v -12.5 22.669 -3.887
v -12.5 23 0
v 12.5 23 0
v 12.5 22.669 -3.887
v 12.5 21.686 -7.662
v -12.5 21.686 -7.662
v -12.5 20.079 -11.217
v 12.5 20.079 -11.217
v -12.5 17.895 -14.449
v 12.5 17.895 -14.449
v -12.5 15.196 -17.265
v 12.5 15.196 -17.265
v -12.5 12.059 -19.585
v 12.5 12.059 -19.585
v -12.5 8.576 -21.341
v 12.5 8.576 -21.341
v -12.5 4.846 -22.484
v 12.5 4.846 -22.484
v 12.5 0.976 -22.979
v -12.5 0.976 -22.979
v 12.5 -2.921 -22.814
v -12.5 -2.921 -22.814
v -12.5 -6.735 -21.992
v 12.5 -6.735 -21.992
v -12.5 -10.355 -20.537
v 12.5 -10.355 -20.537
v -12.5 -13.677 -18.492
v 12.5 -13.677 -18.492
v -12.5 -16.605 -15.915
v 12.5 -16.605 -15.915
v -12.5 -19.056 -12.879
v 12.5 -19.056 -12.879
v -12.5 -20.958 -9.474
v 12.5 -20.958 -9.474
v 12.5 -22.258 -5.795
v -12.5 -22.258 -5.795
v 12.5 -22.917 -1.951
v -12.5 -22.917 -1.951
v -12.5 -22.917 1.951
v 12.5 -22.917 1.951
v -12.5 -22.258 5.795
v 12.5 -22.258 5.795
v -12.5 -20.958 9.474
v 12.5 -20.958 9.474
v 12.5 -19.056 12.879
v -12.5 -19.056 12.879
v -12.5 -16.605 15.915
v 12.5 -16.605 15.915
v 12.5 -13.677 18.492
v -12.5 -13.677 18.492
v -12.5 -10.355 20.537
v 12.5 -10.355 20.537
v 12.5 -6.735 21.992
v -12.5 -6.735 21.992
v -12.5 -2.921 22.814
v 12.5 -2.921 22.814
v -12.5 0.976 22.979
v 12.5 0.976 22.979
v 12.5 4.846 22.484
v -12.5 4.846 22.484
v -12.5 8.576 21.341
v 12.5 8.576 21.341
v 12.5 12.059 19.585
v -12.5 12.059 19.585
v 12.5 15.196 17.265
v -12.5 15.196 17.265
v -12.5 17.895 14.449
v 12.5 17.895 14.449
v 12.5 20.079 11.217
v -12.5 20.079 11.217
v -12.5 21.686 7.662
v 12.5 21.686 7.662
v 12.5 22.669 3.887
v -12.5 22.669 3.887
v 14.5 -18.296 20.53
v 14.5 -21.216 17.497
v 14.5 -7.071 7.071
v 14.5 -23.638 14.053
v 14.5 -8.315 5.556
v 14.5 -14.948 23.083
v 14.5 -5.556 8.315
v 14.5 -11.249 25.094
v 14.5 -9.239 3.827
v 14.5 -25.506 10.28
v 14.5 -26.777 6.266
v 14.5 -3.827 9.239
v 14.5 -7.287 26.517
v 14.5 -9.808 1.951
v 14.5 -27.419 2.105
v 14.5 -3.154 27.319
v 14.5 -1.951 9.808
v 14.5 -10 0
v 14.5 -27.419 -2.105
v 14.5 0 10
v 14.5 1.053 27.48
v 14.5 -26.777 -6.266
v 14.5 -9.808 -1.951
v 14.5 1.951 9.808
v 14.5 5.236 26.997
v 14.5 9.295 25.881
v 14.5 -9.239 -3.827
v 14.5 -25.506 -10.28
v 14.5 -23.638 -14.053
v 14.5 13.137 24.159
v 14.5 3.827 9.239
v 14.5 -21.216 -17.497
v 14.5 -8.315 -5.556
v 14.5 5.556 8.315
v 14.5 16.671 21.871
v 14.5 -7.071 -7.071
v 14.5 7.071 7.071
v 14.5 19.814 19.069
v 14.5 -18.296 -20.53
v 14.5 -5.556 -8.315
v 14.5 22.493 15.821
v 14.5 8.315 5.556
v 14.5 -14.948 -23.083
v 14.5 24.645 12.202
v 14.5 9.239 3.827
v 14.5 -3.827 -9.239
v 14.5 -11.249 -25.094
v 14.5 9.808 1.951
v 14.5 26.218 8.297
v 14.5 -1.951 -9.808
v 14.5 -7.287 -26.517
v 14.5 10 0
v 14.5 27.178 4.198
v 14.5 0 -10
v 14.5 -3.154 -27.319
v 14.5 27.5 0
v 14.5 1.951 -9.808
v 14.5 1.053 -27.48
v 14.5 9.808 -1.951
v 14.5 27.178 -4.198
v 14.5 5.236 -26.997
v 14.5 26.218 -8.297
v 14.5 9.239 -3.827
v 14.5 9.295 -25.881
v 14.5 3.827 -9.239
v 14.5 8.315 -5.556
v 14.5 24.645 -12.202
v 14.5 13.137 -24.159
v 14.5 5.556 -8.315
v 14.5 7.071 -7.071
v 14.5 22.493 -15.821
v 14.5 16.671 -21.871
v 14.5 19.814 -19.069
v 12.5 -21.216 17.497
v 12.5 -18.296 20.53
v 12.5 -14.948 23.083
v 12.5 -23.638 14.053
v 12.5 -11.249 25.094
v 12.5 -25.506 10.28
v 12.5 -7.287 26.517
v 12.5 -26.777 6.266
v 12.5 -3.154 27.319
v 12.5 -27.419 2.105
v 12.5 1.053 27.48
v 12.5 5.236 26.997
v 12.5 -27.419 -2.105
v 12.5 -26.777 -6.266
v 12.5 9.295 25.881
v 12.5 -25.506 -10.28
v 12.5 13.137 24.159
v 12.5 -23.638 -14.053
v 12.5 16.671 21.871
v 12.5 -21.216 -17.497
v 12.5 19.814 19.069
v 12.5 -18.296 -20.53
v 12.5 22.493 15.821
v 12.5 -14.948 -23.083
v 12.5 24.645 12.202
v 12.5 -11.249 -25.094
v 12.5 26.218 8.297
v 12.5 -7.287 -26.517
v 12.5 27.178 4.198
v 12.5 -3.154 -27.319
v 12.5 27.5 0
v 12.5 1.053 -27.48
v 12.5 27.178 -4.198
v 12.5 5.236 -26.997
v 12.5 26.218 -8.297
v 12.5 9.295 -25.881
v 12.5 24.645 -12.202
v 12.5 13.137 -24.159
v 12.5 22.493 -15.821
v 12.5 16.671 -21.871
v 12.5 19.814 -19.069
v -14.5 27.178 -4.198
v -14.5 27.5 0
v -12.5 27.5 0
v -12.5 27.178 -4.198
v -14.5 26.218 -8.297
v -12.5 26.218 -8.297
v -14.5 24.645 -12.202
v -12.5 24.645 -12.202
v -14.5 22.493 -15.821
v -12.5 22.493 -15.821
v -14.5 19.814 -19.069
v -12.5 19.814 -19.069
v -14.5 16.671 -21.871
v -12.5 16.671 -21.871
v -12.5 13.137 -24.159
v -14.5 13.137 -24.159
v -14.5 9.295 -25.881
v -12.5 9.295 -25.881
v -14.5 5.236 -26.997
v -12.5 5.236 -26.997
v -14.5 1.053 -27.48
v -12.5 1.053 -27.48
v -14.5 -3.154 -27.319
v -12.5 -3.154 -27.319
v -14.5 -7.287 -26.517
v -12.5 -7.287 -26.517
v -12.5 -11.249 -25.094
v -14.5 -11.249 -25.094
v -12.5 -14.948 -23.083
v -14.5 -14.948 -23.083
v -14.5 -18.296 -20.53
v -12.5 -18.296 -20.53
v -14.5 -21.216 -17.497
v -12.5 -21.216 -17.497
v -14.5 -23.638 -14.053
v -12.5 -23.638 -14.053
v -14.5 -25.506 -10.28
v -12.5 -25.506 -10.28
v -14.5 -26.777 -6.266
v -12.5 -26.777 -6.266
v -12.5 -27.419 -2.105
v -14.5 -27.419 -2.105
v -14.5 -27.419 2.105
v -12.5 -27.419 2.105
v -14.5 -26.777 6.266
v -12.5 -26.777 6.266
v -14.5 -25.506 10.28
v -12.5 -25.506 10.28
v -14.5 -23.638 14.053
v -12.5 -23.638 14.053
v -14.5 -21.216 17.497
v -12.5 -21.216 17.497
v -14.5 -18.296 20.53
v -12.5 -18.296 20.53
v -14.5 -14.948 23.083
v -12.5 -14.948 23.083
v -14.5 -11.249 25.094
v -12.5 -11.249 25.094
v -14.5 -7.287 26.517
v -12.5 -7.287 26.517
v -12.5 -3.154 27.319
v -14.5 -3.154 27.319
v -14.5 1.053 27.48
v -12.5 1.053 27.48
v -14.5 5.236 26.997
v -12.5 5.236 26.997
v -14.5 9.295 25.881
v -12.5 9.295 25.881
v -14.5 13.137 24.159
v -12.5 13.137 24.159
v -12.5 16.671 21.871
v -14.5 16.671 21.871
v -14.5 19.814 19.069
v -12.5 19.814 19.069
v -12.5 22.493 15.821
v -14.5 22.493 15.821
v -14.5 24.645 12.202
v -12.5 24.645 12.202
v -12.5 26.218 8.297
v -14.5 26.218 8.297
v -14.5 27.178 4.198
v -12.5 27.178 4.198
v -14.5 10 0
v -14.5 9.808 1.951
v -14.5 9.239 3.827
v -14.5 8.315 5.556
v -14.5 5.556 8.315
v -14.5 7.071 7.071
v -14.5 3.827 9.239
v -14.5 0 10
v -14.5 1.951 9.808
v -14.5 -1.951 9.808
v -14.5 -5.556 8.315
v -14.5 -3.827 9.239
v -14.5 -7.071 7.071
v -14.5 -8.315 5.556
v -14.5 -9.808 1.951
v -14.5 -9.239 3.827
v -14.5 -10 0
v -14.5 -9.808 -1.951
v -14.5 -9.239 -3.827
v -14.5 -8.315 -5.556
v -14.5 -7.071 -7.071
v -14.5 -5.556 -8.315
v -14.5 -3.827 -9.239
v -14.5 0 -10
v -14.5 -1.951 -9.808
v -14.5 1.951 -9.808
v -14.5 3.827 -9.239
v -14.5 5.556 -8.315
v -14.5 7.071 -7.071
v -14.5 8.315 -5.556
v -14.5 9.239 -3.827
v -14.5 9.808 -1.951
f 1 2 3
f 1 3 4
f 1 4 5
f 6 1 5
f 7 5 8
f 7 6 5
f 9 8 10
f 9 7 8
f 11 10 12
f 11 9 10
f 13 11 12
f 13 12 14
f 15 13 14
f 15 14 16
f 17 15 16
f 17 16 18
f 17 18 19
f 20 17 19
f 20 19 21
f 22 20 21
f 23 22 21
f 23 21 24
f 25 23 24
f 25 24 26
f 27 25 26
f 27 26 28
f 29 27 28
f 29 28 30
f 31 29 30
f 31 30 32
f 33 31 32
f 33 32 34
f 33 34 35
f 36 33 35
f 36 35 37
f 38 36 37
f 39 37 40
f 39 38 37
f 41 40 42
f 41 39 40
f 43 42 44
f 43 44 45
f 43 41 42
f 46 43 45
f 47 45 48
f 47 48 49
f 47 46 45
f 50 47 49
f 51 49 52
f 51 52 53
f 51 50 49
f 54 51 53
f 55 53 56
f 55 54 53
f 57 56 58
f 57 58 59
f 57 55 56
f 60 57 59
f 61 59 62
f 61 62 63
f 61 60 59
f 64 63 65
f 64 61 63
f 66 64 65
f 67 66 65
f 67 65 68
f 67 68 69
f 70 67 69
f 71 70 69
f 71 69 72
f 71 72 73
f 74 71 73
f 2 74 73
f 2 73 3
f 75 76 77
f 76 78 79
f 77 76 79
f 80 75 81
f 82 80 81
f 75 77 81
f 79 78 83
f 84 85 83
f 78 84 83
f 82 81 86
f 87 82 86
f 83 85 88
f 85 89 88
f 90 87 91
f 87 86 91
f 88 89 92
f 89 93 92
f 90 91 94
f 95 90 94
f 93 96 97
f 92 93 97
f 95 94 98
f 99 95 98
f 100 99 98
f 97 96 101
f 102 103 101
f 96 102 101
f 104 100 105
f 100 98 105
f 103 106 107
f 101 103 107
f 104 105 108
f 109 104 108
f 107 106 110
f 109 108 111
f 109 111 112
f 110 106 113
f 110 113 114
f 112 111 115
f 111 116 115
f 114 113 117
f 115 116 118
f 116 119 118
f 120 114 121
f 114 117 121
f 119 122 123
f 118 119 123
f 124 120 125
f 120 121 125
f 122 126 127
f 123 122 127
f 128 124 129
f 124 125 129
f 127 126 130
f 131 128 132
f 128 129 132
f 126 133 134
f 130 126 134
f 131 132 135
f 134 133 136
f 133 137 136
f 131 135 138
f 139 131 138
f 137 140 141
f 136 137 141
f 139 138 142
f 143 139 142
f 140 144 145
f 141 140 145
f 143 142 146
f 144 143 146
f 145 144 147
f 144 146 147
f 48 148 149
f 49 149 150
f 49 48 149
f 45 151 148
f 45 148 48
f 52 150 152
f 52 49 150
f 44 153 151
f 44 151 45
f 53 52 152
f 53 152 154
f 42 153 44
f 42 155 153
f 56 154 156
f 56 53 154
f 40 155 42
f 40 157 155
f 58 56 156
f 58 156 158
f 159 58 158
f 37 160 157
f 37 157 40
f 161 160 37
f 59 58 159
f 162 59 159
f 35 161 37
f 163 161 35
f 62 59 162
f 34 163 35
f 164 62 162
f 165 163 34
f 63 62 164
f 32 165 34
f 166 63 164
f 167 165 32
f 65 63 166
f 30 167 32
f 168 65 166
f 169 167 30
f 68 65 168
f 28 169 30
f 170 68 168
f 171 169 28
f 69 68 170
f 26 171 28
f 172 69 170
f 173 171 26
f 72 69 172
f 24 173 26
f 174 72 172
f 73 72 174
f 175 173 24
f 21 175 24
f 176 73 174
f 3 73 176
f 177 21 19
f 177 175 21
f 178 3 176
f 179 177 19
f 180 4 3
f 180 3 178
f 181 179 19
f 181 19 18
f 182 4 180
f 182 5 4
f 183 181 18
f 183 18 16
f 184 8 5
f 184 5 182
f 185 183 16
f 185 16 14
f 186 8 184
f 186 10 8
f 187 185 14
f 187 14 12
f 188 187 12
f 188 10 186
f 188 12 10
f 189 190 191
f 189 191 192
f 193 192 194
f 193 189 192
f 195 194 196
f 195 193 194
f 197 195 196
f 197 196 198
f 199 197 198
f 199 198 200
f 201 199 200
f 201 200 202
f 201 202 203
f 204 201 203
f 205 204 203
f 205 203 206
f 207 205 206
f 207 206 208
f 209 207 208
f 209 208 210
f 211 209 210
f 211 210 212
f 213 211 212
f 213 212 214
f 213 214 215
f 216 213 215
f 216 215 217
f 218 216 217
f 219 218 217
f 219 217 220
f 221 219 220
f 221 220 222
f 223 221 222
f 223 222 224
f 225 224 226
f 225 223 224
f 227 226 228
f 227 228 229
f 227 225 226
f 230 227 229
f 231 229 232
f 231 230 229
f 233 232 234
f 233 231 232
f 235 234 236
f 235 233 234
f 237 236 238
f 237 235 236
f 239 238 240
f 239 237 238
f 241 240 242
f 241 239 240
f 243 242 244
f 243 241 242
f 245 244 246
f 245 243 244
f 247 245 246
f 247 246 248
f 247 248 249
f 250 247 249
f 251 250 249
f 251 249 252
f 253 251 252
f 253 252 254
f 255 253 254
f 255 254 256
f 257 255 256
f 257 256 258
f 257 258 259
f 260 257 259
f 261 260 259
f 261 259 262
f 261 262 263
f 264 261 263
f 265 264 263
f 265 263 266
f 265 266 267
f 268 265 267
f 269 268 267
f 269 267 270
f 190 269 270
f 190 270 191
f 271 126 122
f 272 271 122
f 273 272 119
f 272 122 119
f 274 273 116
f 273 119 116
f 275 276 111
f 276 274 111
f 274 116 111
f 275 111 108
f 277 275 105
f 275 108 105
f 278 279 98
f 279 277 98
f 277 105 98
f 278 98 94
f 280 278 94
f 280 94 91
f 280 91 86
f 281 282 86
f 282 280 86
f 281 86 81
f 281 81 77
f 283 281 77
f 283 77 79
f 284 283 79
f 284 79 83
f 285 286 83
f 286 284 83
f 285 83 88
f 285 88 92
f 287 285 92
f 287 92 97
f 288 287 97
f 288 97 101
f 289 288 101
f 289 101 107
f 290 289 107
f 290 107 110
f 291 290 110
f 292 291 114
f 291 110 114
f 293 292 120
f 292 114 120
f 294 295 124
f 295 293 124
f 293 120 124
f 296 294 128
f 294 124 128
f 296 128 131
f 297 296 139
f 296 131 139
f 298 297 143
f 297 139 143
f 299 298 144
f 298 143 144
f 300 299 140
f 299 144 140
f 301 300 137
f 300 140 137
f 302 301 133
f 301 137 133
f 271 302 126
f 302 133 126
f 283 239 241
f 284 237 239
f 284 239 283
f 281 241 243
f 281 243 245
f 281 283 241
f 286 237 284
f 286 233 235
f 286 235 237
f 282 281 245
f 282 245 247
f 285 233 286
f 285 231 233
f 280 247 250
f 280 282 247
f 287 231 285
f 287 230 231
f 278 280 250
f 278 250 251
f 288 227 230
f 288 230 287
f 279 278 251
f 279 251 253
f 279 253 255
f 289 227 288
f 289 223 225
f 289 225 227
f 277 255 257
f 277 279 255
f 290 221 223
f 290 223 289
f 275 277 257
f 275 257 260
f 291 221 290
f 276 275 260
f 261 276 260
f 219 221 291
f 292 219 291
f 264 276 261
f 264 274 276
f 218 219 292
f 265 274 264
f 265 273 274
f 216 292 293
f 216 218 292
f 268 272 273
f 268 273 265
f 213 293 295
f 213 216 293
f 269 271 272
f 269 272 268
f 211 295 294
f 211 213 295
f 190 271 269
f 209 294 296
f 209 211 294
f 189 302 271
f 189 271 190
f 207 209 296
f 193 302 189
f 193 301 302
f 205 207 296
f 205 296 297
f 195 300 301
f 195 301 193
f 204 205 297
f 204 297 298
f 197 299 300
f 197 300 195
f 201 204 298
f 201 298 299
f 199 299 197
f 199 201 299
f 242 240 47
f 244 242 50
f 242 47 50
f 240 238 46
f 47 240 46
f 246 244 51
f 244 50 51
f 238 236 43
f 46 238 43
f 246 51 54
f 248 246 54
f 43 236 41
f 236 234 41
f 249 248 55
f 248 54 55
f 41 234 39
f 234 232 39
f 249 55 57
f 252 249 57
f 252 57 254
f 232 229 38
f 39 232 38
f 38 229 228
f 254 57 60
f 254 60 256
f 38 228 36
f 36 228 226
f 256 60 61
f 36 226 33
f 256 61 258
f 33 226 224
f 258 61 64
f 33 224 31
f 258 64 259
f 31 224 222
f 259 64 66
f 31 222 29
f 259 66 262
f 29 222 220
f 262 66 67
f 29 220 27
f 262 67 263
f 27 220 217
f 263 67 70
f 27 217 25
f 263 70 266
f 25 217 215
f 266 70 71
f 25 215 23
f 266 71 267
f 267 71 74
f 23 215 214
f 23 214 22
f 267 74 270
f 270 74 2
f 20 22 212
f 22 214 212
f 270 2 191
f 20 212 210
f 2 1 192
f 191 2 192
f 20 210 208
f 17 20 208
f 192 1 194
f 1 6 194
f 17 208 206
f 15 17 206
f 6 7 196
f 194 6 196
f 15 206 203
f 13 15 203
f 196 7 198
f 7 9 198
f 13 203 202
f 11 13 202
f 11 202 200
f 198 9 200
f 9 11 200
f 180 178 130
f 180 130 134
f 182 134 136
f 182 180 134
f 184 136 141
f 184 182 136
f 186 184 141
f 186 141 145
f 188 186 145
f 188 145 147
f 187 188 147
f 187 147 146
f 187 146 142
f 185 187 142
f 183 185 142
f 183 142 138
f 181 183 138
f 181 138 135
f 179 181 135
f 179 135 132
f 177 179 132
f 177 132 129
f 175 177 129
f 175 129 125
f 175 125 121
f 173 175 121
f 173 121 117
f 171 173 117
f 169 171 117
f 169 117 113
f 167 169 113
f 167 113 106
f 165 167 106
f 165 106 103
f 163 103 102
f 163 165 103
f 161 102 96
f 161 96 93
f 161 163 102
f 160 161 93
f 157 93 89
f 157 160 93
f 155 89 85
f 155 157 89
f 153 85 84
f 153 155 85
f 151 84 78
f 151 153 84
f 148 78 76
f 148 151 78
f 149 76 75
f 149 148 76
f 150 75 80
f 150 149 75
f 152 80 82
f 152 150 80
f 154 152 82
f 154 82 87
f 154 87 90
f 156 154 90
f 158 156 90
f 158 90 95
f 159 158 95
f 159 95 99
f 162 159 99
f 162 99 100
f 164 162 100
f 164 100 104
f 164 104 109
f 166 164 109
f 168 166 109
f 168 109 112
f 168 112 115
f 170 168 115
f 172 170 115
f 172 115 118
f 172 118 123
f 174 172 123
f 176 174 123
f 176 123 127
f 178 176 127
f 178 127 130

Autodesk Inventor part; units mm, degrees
ref_plane "YZ Plane" through (0, 0, 0) normal (1, 0, 0) x (0, 1, 0)
ref_plane "XZ Plane" through (0, 0, 0) normal (0, 1, 0) x (-1, 0, 0)
ref_plane "XY Plane" through (0, 0, 0) normal (0, 0, 1) x (1, 0, 0)
sketch "Sketch2" plane through (0, 0, 0) normal (0, 0, 1) x (1, 0, 0)
  line L0 (-14.5, 10) -> (14.5, 10)
  line L1 (14.5, 10) -> (14.5, 27.5)
  line L2 (14.5, 27.5) -> (12.5, 27.5)
  line L3 (12.5, 27.5) -> (12.5, 23)
  line L4 (12.5, 23) -> (-12.5, 23)
  line L5 (-12.5, 23) -> (-12.5, 27.5)
  line L6 (-12.5, 27.5) -> (-14.5, 27.5)
  line L7 (-14.5, 27.5) -> (-14.5, 10)
  line L8 (0, 0) -> (-7.6194, 0) construction
  line L9 (0, 0) -> (0, 10) construction
  dimension "d11" = 20
  dimension "d12" = 55
  dimension "d13" = 2
  dimension "d14" = 29
  dimension "d15" = 46
revolve "Revolution1" add sketch "Sketch2" angle 360 about axis through (0, 0, 0) along (-1, 0, 0)
properties part number "Solder Spool" material "SAE 1020"
